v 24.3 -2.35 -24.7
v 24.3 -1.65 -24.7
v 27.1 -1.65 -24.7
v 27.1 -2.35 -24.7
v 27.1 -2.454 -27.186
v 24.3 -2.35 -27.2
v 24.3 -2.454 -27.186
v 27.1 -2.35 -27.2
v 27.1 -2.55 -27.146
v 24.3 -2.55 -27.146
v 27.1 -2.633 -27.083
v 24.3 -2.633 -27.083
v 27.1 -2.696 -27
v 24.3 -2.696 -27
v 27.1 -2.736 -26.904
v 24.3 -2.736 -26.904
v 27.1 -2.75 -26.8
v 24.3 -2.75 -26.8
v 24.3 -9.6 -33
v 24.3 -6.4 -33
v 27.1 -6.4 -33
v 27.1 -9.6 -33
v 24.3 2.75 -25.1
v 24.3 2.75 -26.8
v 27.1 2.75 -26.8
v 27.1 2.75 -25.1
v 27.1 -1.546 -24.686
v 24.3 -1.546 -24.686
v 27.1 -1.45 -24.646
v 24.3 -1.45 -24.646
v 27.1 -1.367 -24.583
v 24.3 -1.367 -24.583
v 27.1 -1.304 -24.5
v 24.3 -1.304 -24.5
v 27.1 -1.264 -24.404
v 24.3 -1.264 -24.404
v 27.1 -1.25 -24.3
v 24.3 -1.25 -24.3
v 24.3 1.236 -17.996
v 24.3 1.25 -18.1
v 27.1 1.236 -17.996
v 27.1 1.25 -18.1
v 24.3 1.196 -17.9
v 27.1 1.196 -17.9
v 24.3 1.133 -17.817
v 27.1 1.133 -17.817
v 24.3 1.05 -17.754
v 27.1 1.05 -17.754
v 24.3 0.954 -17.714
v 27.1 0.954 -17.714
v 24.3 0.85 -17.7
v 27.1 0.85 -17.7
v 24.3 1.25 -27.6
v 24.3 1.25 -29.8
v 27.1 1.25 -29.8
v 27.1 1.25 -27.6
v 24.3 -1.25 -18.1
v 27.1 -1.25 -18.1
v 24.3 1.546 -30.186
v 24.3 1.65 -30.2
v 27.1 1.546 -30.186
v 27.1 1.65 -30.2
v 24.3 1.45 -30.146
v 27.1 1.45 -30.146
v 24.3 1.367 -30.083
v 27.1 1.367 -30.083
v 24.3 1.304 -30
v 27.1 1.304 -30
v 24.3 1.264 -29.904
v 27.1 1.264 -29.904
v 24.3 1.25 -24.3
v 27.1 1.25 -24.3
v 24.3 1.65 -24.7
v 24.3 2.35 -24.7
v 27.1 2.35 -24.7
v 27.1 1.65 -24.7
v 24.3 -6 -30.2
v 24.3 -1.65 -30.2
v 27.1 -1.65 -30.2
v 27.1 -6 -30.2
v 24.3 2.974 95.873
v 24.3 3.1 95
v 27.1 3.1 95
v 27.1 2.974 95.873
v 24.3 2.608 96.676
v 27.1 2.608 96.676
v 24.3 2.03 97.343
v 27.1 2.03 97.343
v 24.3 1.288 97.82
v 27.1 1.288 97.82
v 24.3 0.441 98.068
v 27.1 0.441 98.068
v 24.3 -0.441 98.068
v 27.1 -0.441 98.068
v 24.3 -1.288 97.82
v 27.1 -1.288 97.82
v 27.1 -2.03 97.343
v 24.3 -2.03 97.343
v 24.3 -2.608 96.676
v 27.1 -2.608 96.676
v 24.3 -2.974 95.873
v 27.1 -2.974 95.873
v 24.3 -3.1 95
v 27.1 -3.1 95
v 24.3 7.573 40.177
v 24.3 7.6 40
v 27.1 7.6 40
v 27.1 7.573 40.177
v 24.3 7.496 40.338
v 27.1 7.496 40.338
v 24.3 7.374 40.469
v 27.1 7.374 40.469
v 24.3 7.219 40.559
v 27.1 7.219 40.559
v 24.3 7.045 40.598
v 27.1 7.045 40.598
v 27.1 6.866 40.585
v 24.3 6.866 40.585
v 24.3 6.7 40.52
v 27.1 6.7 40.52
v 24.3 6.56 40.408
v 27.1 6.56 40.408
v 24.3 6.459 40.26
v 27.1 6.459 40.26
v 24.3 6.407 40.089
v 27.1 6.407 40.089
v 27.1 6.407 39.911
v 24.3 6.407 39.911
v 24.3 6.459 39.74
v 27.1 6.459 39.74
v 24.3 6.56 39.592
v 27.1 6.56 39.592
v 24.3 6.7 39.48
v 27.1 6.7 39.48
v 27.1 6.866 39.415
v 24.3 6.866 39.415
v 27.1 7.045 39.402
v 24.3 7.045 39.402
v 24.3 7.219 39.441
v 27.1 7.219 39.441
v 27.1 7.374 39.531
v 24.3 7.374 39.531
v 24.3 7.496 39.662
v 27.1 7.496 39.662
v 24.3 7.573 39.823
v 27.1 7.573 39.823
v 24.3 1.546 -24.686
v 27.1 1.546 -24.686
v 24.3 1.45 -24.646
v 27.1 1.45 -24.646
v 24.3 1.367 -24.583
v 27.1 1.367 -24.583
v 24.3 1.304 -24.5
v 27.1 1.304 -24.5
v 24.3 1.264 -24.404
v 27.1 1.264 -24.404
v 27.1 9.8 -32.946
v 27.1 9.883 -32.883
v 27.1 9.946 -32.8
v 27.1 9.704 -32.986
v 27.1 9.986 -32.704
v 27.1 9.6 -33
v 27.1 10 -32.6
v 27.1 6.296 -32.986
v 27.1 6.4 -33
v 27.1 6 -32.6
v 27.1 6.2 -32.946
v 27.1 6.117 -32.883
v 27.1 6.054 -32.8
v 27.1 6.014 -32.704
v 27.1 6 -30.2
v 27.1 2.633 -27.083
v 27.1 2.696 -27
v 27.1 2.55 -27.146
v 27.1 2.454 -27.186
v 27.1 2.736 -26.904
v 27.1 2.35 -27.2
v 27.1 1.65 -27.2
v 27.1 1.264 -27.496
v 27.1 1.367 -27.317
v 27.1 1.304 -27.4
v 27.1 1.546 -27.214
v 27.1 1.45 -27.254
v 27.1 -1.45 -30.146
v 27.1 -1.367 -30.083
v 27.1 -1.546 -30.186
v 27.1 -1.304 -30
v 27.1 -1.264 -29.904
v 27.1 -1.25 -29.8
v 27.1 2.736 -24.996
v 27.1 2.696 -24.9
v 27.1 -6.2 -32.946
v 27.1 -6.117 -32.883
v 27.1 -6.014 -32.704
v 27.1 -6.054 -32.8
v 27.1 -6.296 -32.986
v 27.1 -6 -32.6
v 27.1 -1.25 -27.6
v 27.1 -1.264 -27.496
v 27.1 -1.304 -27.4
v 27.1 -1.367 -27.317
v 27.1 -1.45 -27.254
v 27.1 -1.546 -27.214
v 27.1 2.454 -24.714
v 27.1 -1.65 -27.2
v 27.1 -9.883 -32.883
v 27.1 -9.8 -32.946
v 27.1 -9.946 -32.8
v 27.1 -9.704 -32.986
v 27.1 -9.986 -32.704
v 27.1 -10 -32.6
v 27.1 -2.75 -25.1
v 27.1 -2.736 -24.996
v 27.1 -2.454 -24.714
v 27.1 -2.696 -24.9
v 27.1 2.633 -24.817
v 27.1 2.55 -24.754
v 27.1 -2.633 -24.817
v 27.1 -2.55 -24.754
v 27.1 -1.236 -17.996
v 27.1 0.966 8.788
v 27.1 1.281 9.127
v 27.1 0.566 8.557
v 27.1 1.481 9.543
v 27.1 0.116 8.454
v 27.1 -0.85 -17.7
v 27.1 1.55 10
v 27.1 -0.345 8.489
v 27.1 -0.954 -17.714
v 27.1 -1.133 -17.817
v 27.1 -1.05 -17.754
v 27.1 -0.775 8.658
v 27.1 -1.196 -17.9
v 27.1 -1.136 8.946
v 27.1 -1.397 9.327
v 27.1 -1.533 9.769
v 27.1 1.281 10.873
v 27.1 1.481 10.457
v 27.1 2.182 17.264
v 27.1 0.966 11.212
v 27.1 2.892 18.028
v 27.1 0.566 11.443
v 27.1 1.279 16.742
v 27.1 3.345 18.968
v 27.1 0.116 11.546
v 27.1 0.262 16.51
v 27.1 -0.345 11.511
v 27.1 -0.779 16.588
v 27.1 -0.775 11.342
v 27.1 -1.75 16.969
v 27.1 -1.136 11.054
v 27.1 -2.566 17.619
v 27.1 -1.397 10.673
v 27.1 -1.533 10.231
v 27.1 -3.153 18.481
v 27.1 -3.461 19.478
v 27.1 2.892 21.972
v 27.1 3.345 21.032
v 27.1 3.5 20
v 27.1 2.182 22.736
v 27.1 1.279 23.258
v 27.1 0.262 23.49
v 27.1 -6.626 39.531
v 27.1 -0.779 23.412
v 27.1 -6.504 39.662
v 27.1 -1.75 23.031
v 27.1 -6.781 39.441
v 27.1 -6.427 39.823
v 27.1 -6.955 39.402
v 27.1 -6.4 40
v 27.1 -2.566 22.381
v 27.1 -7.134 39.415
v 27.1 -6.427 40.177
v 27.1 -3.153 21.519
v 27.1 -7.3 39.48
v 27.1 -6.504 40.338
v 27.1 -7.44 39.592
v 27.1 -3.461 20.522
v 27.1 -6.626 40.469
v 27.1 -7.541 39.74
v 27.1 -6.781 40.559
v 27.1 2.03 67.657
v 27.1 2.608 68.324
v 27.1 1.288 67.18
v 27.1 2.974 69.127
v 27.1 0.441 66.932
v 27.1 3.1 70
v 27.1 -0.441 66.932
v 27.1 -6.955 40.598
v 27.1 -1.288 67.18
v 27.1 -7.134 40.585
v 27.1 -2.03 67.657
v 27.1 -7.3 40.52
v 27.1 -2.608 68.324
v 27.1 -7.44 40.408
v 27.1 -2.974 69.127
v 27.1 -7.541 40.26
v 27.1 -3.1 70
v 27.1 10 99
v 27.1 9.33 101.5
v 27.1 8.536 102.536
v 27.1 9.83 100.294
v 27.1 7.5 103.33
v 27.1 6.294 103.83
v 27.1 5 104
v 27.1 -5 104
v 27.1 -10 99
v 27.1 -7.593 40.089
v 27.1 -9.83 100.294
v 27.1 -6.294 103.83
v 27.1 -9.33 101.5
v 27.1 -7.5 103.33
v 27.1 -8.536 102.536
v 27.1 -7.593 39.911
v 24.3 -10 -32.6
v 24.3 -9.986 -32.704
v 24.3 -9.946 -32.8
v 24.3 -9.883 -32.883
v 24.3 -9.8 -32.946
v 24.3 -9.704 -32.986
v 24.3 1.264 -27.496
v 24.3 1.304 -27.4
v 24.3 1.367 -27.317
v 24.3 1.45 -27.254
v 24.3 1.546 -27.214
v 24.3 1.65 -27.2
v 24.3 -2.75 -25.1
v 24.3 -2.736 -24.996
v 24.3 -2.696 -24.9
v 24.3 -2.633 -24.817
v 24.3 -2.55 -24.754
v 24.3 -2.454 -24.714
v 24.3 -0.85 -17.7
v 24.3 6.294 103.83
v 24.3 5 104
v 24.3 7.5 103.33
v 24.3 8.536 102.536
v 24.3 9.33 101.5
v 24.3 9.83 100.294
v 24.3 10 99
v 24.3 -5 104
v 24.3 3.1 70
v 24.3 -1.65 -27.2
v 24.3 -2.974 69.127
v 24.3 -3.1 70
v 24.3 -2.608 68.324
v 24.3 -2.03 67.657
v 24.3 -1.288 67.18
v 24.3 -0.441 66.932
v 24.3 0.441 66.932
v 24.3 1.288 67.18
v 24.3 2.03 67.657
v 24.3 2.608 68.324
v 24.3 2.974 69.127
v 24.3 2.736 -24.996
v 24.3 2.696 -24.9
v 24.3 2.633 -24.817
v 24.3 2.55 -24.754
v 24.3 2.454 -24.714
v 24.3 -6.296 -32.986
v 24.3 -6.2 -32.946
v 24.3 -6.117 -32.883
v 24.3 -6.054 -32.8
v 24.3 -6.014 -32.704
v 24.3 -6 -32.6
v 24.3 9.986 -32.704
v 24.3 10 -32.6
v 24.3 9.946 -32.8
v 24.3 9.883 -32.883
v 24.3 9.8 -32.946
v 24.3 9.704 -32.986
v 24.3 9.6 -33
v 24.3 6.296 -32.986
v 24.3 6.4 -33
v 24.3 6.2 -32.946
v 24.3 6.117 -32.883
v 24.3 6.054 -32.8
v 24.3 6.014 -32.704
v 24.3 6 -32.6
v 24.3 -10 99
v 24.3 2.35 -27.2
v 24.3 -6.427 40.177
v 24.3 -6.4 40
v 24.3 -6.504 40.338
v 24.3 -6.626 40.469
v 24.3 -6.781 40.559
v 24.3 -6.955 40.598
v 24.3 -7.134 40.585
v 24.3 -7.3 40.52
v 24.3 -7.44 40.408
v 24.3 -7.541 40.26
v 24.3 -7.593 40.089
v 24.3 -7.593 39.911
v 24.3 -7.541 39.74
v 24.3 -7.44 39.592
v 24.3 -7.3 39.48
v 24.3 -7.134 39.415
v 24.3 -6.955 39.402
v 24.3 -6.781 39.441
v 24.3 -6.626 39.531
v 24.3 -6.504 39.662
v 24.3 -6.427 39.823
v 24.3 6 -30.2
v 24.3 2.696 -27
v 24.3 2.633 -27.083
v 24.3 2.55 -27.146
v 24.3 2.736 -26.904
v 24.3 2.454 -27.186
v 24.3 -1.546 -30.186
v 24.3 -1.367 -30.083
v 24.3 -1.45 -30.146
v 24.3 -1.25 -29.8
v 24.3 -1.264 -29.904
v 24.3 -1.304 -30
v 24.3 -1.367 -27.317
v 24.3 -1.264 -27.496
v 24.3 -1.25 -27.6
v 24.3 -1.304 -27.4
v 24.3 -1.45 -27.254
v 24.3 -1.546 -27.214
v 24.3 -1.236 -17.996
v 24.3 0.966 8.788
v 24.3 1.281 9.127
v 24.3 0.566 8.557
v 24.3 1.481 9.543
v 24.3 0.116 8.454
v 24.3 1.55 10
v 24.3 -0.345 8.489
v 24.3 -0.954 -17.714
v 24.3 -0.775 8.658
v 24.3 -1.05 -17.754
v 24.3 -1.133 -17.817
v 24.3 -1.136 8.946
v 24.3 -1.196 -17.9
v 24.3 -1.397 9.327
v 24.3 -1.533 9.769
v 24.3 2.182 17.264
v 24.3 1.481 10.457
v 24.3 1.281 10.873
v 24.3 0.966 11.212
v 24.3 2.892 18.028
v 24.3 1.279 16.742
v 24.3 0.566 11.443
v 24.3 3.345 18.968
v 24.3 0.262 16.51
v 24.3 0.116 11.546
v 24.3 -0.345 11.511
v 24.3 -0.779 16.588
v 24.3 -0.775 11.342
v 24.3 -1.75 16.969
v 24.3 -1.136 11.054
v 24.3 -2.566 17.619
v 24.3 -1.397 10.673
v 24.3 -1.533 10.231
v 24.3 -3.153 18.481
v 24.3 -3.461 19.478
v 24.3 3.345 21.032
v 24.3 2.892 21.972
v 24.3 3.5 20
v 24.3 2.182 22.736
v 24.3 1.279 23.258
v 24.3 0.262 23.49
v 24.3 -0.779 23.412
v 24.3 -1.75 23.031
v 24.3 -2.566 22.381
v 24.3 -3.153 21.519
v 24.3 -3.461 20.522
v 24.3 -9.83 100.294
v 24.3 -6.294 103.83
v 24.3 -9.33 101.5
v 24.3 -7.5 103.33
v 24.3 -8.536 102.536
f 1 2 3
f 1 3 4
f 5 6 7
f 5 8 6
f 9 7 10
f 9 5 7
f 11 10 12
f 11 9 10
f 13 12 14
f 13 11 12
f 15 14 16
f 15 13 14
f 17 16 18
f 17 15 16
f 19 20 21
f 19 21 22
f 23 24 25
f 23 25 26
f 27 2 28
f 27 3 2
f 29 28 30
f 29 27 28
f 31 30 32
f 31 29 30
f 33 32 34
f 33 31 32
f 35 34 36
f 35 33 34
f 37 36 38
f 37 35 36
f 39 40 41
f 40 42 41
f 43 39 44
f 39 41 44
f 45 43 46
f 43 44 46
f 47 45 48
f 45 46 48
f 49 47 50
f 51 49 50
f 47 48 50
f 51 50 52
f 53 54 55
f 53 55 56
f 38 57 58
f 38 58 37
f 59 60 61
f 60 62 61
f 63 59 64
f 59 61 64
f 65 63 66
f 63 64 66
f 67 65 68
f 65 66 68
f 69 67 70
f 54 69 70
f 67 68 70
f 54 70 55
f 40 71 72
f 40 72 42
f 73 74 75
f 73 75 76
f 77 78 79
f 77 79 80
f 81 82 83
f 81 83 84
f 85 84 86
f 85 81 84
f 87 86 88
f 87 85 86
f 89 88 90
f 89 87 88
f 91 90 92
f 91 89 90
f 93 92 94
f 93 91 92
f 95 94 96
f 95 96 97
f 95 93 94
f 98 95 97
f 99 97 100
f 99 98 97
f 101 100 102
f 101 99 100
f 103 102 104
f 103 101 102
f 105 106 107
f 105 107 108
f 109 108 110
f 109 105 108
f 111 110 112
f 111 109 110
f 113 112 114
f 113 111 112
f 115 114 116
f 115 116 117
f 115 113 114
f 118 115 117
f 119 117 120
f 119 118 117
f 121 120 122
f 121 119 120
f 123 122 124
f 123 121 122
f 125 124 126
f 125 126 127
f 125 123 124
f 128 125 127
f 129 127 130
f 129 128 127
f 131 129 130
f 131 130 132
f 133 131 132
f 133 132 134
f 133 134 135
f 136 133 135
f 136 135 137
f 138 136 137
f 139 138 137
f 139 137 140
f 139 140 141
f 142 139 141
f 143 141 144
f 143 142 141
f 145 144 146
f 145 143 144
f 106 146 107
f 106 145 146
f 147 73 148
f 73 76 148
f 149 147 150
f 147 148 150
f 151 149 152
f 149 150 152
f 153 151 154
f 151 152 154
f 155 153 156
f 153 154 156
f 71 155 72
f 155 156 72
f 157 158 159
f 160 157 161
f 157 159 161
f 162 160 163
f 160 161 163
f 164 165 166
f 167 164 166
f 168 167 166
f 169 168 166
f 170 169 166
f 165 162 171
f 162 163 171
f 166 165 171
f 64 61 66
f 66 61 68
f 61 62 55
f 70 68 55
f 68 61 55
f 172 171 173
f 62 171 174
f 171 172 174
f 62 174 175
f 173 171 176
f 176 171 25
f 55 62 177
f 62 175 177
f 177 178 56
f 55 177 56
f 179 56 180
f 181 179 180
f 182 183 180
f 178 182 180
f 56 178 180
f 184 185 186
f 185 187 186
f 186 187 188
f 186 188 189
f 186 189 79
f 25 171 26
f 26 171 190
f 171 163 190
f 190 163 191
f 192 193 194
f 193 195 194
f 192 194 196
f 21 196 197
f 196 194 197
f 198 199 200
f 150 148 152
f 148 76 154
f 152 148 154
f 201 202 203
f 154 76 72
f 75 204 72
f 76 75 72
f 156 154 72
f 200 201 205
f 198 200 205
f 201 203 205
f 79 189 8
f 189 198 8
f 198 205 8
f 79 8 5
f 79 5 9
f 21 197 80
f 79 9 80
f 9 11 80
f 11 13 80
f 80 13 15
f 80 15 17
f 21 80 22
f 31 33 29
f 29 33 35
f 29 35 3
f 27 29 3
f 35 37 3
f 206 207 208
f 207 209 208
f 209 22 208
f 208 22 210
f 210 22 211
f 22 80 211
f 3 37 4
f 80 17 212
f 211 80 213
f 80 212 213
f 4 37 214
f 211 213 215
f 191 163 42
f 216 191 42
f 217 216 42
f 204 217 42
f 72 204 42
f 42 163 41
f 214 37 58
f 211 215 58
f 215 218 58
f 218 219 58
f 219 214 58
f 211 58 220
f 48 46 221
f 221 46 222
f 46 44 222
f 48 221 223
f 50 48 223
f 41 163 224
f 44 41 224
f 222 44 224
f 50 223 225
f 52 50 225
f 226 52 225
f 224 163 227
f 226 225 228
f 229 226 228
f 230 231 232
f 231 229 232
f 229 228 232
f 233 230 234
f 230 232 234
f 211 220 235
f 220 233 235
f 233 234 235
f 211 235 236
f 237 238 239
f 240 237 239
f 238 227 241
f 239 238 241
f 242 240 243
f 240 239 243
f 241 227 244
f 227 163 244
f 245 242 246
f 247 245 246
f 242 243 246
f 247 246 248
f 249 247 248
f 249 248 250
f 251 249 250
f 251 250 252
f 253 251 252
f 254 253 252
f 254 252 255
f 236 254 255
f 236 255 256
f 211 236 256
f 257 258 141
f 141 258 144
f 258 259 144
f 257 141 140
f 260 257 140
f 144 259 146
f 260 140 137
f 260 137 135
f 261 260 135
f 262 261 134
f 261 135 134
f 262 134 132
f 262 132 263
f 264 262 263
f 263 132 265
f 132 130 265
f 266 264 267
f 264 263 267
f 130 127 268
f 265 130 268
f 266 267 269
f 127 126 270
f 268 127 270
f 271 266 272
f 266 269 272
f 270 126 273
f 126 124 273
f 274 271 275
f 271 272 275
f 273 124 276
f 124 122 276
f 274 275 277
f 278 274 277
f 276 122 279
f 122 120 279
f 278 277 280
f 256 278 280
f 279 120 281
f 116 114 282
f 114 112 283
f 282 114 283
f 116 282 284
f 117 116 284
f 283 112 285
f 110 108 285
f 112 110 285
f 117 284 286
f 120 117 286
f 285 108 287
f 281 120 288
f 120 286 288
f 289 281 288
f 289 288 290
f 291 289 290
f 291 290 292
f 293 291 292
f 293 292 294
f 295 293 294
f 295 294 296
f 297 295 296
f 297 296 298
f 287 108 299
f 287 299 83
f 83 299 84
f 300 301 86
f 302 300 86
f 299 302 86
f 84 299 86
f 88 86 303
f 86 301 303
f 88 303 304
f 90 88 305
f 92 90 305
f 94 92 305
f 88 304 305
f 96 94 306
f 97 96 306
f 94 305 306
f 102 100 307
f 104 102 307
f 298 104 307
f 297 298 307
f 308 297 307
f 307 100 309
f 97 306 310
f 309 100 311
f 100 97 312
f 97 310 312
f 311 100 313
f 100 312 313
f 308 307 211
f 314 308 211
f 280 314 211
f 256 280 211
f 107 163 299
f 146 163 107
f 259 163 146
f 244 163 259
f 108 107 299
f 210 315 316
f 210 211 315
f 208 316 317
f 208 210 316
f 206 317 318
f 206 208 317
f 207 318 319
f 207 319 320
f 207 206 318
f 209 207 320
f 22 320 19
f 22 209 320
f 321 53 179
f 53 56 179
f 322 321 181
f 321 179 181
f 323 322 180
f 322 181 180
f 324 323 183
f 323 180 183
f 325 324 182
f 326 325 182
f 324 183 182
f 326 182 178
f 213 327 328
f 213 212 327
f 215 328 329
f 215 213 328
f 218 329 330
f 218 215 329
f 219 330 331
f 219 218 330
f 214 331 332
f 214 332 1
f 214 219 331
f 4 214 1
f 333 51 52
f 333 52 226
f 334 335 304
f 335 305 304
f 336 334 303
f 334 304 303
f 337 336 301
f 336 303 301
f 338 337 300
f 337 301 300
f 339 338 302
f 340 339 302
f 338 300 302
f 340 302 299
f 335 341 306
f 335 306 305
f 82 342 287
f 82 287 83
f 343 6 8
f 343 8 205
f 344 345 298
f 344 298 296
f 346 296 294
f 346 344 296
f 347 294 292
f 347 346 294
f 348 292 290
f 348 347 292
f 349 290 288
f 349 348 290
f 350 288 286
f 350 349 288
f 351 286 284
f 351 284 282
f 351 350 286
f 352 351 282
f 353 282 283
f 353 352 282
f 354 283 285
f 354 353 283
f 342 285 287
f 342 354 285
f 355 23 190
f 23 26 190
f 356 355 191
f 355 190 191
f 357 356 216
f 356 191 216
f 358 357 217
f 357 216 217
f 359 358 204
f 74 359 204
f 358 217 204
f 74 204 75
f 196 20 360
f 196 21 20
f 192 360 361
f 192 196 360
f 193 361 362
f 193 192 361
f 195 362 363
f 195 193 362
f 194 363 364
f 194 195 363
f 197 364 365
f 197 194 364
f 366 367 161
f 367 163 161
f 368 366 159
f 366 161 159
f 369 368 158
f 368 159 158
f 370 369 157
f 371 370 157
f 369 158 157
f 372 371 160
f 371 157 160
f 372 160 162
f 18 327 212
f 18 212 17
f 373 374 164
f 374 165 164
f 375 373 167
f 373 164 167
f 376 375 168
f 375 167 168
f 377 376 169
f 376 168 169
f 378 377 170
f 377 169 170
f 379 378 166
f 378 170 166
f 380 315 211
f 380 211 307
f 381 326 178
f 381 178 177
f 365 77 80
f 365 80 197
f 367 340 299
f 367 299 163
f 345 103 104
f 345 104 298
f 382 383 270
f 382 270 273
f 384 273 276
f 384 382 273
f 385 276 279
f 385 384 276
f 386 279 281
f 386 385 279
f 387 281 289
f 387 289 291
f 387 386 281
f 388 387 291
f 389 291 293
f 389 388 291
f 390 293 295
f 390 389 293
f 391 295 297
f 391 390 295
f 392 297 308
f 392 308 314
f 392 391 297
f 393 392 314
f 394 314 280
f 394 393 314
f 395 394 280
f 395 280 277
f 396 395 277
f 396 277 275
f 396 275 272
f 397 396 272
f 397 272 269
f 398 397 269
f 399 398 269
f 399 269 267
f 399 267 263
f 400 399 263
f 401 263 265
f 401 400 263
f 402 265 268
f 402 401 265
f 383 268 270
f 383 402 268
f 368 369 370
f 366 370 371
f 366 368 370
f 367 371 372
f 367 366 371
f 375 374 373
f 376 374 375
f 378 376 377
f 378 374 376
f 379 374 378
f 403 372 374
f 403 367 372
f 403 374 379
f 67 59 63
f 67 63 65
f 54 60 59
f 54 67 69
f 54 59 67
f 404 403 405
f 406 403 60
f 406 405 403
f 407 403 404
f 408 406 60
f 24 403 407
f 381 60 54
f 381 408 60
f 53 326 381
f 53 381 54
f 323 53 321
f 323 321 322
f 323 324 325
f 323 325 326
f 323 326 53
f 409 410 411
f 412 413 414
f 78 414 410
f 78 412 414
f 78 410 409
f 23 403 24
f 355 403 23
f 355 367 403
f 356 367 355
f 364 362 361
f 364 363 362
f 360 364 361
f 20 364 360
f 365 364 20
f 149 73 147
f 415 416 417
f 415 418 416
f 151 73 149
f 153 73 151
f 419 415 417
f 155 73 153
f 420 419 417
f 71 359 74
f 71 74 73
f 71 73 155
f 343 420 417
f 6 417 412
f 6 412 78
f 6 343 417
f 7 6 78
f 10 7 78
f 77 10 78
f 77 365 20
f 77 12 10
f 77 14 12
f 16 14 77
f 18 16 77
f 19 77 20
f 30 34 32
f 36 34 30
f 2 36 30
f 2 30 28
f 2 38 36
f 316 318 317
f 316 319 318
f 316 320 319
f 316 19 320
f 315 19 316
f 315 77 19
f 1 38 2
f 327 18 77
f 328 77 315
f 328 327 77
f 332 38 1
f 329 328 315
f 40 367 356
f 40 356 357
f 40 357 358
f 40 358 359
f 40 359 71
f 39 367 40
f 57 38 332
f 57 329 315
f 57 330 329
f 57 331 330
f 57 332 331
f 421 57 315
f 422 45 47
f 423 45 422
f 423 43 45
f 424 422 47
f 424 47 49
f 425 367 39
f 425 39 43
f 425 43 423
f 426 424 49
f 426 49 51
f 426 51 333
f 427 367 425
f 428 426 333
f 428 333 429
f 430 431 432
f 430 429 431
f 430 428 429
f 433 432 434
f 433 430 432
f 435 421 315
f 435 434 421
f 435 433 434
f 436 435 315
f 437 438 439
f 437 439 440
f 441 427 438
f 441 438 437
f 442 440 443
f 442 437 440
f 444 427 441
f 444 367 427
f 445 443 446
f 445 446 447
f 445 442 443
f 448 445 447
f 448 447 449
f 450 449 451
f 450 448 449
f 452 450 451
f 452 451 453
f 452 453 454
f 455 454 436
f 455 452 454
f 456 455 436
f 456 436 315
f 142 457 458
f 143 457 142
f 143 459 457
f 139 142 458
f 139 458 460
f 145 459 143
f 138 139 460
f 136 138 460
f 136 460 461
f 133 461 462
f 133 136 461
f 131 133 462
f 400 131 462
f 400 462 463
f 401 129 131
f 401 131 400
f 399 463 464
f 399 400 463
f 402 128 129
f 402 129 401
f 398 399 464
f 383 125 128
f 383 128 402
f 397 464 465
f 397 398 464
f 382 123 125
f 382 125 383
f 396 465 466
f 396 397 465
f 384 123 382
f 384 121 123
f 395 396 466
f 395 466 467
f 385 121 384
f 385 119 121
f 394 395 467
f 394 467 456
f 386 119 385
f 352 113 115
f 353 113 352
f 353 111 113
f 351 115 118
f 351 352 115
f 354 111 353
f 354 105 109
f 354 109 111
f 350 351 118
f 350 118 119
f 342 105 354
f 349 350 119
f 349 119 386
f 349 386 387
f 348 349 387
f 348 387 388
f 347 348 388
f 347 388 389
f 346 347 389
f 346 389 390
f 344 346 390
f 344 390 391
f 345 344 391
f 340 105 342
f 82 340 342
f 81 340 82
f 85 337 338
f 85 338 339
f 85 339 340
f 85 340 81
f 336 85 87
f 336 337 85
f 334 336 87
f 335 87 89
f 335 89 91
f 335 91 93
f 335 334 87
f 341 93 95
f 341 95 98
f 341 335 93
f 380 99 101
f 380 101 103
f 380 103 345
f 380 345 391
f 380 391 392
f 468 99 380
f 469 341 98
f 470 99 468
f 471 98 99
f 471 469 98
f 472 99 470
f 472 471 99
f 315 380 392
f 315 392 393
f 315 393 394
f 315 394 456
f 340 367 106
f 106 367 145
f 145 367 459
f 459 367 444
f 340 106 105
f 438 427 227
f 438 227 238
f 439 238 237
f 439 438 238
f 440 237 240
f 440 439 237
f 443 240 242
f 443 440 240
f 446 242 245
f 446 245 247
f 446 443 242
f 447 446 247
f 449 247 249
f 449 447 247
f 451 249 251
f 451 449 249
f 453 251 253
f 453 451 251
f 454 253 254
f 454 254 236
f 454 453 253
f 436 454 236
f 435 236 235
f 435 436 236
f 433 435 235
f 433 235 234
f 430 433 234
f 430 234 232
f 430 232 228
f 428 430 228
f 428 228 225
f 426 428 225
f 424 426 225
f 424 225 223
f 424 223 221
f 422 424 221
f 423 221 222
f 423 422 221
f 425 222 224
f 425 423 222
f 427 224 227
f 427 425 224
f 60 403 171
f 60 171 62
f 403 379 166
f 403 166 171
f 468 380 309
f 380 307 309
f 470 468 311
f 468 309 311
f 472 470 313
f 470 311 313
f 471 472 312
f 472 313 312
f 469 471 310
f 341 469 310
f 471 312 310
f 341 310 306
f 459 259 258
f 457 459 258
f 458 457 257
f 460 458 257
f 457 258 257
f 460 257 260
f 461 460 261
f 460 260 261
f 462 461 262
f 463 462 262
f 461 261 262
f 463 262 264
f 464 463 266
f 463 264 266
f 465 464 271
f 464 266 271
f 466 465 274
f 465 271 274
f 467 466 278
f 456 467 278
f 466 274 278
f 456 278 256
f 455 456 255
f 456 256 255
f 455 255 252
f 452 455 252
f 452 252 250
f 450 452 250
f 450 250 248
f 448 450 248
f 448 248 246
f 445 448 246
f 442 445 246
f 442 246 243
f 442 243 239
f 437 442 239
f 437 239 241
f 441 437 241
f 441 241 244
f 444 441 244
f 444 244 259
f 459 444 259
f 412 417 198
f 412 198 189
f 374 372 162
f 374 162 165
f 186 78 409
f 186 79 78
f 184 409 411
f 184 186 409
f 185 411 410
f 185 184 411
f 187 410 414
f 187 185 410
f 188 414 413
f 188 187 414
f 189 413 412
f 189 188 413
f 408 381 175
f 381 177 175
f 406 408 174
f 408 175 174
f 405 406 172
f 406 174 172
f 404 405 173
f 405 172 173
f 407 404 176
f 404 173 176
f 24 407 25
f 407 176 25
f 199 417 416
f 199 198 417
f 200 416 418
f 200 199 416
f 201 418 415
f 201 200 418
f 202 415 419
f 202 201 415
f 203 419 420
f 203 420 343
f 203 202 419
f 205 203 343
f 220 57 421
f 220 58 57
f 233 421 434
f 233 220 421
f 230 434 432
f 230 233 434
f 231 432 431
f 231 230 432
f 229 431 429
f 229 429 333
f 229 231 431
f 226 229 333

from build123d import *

# Parameters (mm, degrees)
SKETCH001_R             = 1.55
SKETCH001_R_2           = 0.6
PAD004_DEPTH            = 2.8
FILLET_R                = 0.4
FILLET001_R             = 5
SKETCH019_R             = 3.5
POCKET_DEPTH            = 2.801
BODY014_PLACEMENT_ANGLE = 180


with BuildPart() as part:
    # Sketch001 (on DatumPlane) → Pad004 (new body)
    with BuildSketch(Plane(origin=(-24.3, 0, 0), x_dir=(0, -1, 0), z_dir=(-1, 0, 0))):
        Polygon((-10, 84), (10, 84), (10, -53), (6, -53), (6, -50.2), (1.25, -50.2), (1.25, -47.2), (2.75, -47.2), (2.75, -44.7), (1.25, -44.7), (1.25, -37.7), (-1.25, -37.7), (-1.25, -44.7), (-2.75, -44.7), (-2.75, -47.2), (-1.25, -47.2), (-1.25, -50.2), (-6, -50.2), (-6, -53), (-10, -53), align=None)
        with Locations((0, -10)):
            Circle(SKETCH001_R, mode=Mode.SUBTRACT)
        with Locations((-7, 20)):
            Circle(SKETCH001_R_2, mode=Mode.SUBTRACT)
        with Locations((7, 20)):
            Circle(SKETCH001_R_2, mode=Mode.SUBTRACT)
        with BuildLine():
            ThreePointArc((3.1, 75), (0, 78.1), (-3.1, 75))
            Line((-3.1, 75), (-3.1, 50))
            ThreePointArc((-3.1, 50), (0, 46.9), (3.1, 50))
            Line((3.1, 50), (3.1, 75))
        make_face(mode=Mode.SUBTRACT)
    extrude(amount=PAD004_DEPTH)

    # Fillet
    fillet_edges = [part.edges().sort_by_distance(p)[0] for p in [
        (-25.7, 10, -53),
        (-25.7, 6, -53),
        (-25.7, -10, -53),
        (-25.7, -6, -53),
        (-25.7, 1.25, -50.2),
        (-25.7, -1.25, -50.2),
        (-25.7, 1.25, -37.7),
        (-25.7, -1.25, -37.7),
        (-25.7, 1.25, -47.2),
        (-25.7, -1.25, -47.2),
        (-25.7, 1.25, -44.7),
        (-25.7, -1.25, -44.7),
        (-25.7, -2.75, -47.2),
        (-25.7, 2.75, -47.2),
        (-25.7, 2.75, -44.7),
        (-25.7, -2.75, -44.7),
    ]]
    fillet(fillet_edges, radius=FILLET_R)

    # Fillet001
    fillet001_edges = [part.edges().sort_by_distance(p)[0] for p in [
        (-25.7, 10, 84),
        (-25.7, -10, 84),
    ]]
    fillet(fillet001_edges, radius=FILLET001_R)

    # Sketch019 (on Face47 of Fillet001) → Pocket (cut, through all)
    with BuildSketch(Plane(origin=(-27.1, 0, 0), x_dir=(0, -1, 0), z_dir=(-1, 0, 0))):
        Circle(SKETCH019_R)
    extrude(amount=-POCKET_DEPTH, mode=Mode.SUBTRACT)


with BuildPart() as part_1:
    # Body014 placement: moved
    add(part.part.moved(Location((0, 0, 20))).rotate(Axis((0, 0, 20), (0, 0, 1)), BODY014_PLACEMENT_ANGLE))


solid = part_1.part
